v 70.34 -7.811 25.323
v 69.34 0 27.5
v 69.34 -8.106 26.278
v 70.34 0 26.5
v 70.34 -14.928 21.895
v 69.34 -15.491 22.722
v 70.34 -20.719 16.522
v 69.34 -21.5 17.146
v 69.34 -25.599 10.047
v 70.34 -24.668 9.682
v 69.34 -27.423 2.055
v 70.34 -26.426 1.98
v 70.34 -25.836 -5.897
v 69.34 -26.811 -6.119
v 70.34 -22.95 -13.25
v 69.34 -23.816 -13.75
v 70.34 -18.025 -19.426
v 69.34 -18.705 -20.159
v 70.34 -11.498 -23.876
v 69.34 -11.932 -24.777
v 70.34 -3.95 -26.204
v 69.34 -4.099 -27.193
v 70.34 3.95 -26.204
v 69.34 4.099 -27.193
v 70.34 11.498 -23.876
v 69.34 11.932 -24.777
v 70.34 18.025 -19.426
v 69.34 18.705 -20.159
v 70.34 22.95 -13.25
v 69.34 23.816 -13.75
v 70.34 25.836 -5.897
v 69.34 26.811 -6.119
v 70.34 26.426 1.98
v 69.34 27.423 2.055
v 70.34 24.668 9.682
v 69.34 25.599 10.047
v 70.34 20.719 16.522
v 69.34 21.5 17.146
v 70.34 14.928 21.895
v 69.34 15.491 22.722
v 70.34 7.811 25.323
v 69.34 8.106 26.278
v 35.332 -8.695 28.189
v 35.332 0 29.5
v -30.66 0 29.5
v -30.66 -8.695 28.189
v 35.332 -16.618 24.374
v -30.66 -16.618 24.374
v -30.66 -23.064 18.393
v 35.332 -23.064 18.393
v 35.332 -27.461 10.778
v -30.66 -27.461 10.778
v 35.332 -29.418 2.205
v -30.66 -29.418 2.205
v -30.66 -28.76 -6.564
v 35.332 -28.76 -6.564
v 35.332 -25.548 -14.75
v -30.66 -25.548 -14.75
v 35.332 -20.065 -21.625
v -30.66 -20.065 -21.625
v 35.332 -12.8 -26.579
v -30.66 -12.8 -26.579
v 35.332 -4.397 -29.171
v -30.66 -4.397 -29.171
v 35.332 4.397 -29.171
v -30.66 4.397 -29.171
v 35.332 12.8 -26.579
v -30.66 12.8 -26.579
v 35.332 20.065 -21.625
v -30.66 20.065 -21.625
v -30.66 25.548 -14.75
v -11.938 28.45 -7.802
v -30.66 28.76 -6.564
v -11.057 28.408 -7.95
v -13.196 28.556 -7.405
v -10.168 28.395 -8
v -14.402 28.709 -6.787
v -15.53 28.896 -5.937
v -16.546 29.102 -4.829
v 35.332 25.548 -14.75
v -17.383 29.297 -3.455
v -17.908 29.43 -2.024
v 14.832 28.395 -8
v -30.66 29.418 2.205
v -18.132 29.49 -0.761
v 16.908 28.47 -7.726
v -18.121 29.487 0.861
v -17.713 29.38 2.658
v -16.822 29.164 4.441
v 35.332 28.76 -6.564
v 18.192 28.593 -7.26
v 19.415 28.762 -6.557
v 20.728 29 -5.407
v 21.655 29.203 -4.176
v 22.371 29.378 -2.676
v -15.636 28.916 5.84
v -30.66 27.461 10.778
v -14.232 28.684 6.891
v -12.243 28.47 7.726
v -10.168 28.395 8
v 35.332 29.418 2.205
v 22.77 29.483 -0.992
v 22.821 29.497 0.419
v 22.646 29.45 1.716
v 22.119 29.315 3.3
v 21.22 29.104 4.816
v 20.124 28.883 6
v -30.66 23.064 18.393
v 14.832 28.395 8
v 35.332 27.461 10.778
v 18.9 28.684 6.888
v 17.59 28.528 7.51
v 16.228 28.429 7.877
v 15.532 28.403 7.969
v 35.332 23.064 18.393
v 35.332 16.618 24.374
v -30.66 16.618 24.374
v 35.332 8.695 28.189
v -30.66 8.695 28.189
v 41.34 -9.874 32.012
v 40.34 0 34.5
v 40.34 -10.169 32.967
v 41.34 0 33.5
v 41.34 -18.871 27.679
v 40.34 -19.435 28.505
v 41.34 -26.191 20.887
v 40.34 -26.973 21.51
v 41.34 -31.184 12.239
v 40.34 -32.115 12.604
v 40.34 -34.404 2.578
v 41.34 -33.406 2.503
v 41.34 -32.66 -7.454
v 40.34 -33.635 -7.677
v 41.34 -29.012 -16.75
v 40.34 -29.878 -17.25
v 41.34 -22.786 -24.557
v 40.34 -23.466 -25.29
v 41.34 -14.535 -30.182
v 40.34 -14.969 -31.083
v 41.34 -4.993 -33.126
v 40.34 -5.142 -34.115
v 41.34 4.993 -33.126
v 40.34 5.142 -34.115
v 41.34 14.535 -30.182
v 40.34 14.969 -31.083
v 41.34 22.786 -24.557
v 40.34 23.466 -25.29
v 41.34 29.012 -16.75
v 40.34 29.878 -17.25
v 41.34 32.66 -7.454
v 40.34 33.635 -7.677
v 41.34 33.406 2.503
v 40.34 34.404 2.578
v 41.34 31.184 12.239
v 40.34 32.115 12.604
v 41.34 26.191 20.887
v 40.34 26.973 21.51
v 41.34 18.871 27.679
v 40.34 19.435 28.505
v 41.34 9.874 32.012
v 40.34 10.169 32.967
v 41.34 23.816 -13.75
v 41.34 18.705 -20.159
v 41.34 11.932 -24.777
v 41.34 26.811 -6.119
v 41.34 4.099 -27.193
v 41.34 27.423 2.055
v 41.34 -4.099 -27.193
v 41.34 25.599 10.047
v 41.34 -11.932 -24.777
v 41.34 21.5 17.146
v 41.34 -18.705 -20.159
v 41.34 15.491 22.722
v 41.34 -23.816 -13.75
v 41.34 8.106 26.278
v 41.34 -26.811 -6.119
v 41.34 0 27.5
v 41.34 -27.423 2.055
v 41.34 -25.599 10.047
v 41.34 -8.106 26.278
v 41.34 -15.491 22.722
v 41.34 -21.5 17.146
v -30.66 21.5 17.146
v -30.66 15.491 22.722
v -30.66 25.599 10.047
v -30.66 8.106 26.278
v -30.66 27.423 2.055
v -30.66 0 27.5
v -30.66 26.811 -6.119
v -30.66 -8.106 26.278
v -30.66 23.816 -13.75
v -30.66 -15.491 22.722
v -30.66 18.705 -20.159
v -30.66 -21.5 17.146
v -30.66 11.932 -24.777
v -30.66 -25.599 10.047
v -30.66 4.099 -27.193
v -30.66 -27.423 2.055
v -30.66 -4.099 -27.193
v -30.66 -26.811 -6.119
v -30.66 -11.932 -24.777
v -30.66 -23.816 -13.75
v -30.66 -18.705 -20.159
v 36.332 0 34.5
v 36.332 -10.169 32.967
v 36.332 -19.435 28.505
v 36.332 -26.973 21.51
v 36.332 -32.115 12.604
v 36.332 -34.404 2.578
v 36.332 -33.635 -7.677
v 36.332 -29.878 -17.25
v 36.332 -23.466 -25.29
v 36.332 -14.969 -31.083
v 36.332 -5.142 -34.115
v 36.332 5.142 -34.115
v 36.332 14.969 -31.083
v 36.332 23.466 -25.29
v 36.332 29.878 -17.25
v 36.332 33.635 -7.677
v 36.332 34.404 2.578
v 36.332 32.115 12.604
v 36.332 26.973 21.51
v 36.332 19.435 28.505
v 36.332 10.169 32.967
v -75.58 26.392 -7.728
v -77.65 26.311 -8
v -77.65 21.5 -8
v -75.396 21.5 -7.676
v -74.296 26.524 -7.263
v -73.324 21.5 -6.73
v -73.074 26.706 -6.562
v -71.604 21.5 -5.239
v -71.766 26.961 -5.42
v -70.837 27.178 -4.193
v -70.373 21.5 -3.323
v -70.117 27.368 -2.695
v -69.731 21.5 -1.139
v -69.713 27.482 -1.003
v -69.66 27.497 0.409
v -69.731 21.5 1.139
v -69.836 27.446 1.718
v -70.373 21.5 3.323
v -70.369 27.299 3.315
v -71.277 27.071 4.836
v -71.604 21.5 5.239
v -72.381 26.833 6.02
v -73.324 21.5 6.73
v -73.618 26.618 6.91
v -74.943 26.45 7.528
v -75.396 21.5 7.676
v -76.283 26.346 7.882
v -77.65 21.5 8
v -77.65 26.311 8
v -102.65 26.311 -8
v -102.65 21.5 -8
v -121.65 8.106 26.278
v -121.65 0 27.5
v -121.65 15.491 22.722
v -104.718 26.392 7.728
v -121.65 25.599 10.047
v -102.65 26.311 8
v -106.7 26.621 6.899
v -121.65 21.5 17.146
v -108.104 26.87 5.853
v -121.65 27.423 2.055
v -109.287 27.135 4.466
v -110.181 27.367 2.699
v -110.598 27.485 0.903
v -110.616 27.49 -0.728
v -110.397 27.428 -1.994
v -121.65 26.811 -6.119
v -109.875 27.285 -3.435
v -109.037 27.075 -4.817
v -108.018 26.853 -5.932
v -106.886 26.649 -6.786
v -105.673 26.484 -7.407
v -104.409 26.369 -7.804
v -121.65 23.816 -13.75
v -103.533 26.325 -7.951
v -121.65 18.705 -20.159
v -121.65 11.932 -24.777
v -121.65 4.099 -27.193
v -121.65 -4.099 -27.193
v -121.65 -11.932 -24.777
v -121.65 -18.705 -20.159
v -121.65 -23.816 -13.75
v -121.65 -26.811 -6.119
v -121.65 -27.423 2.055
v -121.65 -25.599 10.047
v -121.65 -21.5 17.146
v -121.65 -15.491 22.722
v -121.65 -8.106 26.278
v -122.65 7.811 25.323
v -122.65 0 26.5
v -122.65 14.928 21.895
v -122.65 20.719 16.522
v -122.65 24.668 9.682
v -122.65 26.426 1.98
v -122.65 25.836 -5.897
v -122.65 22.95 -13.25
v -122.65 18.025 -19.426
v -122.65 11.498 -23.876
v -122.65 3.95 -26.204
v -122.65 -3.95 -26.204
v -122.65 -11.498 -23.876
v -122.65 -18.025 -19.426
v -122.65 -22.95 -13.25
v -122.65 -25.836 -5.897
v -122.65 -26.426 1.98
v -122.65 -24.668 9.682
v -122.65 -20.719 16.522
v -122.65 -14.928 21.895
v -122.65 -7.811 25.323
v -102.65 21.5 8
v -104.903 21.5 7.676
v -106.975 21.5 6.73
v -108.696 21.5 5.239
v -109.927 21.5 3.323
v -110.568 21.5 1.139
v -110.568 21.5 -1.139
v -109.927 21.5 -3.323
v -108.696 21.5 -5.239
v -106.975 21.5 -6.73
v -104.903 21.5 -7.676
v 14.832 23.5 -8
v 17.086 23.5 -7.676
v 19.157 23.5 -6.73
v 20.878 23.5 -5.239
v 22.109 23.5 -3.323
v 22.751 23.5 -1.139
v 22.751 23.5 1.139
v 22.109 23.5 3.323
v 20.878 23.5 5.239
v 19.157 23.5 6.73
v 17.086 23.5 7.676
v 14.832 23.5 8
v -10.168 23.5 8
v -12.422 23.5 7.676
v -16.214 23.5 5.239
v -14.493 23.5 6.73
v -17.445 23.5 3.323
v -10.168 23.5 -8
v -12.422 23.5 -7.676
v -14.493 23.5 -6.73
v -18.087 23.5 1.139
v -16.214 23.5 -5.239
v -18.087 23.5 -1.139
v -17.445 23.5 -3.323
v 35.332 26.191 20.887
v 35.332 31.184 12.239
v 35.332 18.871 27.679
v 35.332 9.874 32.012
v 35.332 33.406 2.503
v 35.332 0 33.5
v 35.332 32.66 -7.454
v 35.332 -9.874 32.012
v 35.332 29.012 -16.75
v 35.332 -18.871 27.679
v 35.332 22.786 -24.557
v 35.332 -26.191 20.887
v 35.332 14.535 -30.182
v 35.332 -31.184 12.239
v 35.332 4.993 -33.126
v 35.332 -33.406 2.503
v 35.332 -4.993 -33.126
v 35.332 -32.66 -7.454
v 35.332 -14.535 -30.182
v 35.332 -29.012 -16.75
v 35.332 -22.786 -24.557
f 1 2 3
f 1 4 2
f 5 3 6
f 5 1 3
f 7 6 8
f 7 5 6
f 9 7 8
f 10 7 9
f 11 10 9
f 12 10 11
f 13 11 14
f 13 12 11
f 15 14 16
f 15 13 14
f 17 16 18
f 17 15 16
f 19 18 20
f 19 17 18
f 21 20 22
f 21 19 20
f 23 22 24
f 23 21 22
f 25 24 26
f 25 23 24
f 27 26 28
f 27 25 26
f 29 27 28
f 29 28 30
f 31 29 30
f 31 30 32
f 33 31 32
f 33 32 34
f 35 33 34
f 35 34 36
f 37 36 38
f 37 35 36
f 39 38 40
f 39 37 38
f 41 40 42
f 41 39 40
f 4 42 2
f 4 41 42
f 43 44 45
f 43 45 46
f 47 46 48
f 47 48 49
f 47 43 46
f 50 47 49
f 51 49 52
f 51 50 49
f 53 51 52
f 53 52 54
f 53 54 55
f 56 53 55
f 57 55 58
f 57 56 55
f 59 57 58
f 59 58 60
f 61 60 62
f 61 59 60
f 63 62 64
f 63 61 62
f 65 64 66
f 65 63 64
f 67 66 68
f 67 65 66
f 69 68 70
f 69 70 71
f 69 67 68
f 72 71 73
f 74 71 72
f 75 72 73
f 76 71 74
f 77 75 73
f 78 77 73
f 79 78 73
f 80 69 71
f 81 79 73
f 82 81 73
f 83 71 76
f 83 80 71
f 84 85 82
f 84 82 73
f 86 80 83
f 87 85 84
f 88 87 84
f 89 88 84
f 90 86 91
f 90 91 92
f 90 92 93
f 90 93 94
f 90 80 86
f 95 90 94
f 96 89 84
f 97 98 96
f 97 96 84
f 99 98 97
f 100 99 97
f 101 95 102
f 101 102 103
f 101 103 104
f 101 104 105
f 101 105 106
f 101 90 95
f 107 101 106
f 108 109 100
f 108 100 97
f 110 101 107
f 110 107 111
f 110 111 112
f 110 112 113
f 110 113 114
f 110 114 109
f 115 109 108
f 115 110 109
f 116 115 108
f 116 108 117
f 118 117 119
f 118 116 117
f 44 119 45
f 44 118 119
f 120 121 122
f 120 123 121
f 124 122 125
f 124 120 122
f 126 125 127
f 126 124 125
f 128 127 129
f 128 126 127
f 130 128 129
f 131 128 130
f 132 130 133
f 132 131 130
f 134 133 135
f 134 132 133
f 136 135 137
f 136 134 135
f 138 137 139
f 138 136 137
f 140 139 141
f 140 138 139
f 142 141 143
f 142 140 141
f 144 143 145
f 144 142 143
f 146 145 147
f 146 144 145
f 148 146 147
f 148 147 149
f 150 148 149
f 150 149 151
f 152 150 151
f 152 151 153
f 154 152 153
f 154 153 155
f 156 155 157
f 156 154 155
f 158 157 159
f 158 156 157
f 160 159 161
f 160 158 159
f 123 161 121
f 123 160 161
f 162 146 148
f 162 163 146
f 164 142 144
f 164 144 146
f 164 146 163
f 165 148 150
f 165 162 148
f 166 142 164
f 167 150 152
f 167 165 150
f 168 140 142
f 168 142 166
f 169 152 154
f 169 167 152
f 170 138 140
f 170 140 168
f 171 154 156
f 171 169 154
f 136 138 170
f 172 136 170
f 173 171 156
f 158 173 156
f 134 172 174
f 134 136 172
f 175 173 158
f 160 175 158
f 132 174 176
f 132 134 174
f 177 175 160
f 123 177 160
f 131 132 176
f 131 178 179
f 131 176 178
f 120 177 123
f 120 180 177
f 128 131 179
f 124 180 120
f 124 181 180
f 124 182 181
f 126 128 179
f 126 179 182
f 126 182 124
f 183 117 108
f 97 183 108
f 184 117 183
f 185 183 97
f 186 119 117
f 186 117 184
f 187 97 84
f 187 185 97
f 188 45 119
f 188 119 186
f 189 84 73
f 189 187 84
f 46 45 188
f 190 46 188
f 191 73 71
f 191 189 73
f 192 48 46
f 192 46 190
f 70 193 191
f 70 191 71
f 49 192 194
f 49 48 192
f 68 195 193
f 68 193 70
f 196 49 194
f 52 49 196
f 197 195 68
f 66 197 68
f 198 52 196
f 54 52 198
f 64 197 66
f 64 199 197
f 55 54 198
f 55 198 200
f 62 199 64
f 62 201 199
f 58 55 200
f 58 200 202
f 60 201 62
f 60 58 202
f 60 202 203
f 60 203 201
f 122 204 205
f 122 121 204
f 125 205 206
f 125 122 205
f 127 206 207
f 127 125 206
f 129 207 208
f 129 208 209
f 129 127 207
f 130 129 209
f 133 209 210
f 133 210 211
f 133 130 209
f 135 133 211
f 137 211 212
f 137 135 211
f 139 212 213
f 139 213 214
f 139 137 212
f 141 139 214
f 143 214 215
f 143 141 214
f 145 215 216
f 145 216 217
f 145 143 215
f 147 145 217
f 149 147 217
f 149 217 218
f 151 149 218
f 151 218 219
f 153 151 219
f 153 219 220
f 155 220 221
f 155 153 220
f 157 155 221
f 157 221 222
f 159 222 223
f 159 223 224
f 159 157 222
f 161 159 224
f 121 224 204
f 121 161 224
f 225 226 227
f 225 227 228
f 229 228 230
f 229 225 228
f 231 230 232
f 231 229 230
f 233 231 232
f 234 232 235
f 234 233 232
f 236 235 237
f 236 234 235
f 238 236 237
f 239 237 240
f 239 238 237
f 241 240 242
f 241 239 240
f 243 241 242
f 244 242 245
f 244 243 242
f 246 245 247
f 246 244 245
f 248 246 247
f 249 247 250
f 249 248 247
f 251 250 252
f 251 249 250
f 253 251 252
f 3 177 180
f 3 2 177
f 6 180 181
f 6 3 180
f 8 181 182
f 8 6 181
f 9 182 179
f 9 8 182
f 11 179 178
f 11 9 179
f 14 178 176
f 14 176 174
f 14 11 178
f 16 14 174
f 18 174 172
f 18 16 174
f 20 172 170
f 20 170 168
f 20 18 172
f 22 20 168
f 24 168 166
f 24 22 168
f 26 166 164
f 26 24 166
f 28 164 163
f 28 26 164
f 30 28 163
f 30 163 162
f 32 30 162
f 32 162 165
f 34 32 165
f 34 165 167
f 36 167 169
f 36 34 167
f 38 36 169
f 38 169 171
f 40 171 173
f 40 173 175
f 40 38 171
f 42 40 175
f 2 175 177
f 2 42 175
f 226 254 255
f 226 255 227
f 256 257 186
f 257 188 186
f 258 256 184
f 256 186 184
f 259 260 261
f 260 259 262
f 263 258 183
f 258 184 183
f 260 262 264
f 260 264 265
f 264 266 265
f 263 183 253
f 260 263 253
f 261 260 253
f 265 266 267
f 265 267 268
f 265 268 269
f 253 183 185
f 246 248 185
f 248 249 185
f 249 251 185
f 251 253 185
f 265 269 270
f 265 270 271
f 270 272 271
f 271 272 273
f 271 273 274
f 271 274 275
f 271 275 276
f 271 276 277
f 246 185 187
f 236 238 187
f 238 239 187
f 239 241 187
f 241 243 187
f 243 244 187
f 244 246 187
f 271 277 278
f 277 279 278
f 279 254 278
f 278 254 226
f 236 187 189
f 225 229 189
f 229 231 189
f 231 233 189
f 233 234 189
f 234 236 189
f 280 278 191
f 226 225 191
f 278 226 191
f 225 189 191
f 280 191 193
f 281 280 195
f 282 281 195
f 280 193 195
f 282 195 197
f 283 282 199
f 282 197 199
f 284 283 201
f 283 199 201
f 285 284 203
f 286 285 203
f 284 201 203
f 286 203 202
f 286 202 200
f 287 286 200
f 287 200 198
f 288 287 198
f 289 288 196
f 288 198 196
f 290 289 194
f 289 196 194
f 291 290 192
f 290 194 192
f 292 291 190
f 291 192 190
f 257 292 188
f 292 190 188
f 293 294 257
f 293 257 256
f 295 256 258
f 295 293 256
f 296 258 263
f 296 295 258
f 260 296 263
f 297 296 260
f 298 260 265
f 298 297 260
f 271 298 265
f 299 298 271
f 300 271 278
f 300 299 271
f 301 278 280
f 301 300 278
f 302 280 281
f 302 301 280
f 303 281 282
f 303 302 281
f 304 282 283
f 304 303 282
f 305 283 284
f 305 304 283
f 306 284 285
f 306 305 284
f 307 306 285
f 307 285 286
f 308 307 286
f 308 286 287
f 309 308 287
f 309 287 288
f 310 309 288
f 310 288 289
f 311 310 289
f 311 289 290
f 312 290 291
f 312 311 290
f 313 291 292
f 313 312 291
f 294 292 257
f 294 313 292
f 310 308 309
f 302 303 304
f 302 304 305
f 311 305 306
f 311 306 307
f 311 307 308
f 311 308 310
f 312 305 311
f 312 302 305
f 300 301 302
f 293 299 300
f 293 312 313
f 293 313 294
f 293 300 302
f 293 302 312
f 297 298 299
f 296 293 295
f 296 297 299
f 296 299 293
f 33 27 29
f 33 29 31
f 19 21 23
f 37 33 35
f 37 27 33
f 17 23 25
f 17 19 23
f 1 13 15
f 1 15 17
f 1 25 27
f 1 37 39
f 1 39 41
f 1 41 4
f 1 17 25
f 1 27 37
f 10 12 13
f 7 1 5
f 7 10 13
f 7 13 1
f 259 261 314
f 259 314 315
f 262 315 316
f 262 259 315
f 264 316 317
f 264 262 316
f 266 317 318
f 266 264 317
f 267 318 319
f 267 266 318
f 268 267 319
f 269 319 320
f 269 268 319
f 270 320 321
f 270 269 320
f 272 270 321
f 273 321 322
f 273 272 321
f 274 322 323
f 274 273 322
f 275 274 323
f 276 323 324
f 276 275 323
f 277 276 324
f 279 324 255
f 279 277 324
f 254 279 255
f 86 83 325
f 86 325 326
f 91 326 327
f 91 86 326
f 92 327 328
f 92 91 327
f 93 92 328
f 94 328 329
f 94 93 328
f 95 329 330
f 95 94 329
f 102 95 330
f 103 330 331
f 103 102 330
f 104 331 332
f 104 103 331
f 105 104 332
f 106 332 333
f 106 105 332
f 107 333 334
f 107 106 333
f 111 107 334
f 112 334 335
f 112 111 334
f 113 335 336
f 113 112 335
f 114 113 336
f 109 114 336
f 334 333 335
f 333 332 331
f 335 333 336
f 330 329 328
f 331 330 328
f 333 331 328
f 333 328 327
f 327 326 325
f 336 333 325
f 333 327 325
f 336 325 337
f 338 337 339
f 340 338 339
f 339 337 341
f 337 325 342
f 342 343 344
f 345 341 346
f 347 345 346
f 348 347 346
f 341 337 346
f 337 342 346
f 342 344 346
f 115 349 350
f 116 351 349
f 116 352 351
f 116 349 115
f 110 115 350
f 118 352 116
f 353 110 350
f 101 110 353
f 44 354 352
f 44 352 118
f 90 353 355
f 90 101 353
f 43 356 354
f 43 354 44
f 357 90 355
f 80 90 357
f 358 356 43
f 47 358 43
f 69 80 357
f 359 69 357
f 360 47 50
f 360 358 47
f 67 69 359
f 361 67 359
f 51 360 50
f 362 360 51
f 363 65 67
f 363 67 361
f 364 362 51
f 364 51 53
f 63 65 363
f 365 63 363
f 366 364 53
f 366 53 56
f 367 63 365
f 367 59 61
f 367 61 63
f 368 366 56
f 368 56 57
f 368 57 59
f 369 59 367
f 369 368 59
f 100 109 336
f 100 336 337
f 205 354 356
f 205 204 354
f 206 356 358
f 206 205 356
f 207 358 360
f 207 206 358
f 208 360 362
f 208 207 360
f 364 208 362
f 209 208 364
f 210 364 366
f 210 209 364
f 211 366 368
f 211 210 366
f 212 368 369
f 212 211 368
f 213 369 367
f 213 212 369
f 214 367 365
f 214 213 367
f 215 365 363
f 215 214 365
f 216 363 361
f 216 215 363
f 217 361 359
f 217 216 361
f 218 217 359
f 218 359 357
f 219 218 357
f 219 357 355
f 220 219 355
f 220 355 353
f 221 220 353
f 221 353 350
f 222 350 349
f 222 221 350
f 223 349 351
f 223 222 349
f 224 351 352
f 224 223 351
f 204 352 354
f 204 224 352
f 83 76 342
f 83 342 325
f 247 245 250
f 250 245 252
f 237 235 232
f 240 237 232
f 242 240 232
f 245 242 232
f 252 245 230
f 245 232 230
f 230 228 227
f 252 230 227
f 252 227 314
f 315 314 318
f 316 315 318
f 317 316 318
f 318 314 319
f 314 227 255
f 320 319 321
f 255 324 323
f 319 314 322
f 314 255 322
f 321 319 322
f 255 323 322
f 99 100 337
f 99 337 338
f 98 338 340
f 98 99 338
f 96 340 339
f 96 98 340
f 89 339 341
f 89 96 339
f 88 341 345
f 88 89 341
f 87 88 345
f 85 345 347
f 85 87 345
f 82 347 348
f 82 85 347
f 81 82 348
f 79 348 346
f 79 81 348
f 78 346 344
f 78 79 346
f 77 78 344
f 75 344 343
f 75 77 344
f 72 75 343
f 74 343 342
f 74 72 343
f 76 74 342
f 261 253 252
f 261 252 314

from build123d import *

# Parameters (mm, degrees)
CUT_EXTRUDE1_DEPTH  = 6
SKETCH3_R           = 27.5
BOSS_EXTRUDE1_DEPTH = 63
CHAMFER1_SIZE       = 1
CUT_EXTRUDE2_DEPTH  = 6


with BuildPart() as part:
    # Sketch1 → Revolve1 (revolve)
    with BuildSketch(Plane.XY, mode=Mode.PRIVATE) as revolve1_sk:
        Polygon((-59.649564477, 0), (-59.649564477, 27.5), (-30.659969427, 27.5), (-30.659969427, 29.5), (35.33203125, 29.5), (35.33203125, 33.5), (36.33203125, 34.5), (40.340030573, 34.5), (41.340030573, 33.5), (41.340030573, 27.5), (69.340030573, 27.5), (70.340030573, 26.5), (70.340030573, 0), align=None)
    revolve(revolve1_sk.sketch.rotate(Axis((-72.236328125, 0, 0), (1, 0, 0)), 90), axis=Axis((-72.236328125, 0, 0), (1, 0, 0)))

    # Sketch2 → Cut-Extrude1 (cut)
    with BuildSketch(Plane(origin=(0, 29.5, 0), x_dir=(1, 0, 0), z_dir=(0, 1, 0))):
        with BuildLine():
            Line((-10.16796875, 8), (14.83203125, 8))
            ThreePointArc((14.83203125, 8), (22.83203125, 0), (14.83203125, -8))
            Line((14.83203125, -8), (-10.16796875, -8))
            ThreePointArc((-10.16796875, -8), (-18.16796875, 0), (-10.16796875, 8))
        make_face()
    extrude(amount=-CUT_EXTRUDE1_DEPTH, mode=Mode.SUBTRACT)

    # Sketch3 → Boss-Extrude1 (add)
    with BuildSketch(Plane.ZY.offset(59.649564477)):
        Circle(SKETCH3_R)
    extrude(amount=BOSS_EXTRUDE1_DEPTH)

    # Chamfer1
    chamfer1_edges = [part.edges().sort_by_distance(p)[0] for p in [
        (-122.649564477, 0, -27.5),
    ]]
    chamfer(chamfer1_edges, length=CHAMFER1_SIZE)

    # Sketch4 → Cut-Extrude2 (cut)
    with BuildSketch(Plane(origin=(0, 27.5, 0), x_dir=(1, 0, 0), z_dir=(0, 1, 0))):
        with BuildLine():
            Line((-102.649564477, 8), (-77.649564477, 8))
            ThreePointArc((-77.649564477, 8), (-69.649564477, 0), (-77.649564477, -8))
            Line((-77.649564477, -8), (-102.649564477, -8))
            ThreePointArc((-102.649564477, -8), (-110.649564477, 0), (-102.649564477, 8))
        make_face()
    extrude(amount=-CUT_EXTRUDE2_DEPTH, mode=Mode.SUBTRACT)


solid = part.part
